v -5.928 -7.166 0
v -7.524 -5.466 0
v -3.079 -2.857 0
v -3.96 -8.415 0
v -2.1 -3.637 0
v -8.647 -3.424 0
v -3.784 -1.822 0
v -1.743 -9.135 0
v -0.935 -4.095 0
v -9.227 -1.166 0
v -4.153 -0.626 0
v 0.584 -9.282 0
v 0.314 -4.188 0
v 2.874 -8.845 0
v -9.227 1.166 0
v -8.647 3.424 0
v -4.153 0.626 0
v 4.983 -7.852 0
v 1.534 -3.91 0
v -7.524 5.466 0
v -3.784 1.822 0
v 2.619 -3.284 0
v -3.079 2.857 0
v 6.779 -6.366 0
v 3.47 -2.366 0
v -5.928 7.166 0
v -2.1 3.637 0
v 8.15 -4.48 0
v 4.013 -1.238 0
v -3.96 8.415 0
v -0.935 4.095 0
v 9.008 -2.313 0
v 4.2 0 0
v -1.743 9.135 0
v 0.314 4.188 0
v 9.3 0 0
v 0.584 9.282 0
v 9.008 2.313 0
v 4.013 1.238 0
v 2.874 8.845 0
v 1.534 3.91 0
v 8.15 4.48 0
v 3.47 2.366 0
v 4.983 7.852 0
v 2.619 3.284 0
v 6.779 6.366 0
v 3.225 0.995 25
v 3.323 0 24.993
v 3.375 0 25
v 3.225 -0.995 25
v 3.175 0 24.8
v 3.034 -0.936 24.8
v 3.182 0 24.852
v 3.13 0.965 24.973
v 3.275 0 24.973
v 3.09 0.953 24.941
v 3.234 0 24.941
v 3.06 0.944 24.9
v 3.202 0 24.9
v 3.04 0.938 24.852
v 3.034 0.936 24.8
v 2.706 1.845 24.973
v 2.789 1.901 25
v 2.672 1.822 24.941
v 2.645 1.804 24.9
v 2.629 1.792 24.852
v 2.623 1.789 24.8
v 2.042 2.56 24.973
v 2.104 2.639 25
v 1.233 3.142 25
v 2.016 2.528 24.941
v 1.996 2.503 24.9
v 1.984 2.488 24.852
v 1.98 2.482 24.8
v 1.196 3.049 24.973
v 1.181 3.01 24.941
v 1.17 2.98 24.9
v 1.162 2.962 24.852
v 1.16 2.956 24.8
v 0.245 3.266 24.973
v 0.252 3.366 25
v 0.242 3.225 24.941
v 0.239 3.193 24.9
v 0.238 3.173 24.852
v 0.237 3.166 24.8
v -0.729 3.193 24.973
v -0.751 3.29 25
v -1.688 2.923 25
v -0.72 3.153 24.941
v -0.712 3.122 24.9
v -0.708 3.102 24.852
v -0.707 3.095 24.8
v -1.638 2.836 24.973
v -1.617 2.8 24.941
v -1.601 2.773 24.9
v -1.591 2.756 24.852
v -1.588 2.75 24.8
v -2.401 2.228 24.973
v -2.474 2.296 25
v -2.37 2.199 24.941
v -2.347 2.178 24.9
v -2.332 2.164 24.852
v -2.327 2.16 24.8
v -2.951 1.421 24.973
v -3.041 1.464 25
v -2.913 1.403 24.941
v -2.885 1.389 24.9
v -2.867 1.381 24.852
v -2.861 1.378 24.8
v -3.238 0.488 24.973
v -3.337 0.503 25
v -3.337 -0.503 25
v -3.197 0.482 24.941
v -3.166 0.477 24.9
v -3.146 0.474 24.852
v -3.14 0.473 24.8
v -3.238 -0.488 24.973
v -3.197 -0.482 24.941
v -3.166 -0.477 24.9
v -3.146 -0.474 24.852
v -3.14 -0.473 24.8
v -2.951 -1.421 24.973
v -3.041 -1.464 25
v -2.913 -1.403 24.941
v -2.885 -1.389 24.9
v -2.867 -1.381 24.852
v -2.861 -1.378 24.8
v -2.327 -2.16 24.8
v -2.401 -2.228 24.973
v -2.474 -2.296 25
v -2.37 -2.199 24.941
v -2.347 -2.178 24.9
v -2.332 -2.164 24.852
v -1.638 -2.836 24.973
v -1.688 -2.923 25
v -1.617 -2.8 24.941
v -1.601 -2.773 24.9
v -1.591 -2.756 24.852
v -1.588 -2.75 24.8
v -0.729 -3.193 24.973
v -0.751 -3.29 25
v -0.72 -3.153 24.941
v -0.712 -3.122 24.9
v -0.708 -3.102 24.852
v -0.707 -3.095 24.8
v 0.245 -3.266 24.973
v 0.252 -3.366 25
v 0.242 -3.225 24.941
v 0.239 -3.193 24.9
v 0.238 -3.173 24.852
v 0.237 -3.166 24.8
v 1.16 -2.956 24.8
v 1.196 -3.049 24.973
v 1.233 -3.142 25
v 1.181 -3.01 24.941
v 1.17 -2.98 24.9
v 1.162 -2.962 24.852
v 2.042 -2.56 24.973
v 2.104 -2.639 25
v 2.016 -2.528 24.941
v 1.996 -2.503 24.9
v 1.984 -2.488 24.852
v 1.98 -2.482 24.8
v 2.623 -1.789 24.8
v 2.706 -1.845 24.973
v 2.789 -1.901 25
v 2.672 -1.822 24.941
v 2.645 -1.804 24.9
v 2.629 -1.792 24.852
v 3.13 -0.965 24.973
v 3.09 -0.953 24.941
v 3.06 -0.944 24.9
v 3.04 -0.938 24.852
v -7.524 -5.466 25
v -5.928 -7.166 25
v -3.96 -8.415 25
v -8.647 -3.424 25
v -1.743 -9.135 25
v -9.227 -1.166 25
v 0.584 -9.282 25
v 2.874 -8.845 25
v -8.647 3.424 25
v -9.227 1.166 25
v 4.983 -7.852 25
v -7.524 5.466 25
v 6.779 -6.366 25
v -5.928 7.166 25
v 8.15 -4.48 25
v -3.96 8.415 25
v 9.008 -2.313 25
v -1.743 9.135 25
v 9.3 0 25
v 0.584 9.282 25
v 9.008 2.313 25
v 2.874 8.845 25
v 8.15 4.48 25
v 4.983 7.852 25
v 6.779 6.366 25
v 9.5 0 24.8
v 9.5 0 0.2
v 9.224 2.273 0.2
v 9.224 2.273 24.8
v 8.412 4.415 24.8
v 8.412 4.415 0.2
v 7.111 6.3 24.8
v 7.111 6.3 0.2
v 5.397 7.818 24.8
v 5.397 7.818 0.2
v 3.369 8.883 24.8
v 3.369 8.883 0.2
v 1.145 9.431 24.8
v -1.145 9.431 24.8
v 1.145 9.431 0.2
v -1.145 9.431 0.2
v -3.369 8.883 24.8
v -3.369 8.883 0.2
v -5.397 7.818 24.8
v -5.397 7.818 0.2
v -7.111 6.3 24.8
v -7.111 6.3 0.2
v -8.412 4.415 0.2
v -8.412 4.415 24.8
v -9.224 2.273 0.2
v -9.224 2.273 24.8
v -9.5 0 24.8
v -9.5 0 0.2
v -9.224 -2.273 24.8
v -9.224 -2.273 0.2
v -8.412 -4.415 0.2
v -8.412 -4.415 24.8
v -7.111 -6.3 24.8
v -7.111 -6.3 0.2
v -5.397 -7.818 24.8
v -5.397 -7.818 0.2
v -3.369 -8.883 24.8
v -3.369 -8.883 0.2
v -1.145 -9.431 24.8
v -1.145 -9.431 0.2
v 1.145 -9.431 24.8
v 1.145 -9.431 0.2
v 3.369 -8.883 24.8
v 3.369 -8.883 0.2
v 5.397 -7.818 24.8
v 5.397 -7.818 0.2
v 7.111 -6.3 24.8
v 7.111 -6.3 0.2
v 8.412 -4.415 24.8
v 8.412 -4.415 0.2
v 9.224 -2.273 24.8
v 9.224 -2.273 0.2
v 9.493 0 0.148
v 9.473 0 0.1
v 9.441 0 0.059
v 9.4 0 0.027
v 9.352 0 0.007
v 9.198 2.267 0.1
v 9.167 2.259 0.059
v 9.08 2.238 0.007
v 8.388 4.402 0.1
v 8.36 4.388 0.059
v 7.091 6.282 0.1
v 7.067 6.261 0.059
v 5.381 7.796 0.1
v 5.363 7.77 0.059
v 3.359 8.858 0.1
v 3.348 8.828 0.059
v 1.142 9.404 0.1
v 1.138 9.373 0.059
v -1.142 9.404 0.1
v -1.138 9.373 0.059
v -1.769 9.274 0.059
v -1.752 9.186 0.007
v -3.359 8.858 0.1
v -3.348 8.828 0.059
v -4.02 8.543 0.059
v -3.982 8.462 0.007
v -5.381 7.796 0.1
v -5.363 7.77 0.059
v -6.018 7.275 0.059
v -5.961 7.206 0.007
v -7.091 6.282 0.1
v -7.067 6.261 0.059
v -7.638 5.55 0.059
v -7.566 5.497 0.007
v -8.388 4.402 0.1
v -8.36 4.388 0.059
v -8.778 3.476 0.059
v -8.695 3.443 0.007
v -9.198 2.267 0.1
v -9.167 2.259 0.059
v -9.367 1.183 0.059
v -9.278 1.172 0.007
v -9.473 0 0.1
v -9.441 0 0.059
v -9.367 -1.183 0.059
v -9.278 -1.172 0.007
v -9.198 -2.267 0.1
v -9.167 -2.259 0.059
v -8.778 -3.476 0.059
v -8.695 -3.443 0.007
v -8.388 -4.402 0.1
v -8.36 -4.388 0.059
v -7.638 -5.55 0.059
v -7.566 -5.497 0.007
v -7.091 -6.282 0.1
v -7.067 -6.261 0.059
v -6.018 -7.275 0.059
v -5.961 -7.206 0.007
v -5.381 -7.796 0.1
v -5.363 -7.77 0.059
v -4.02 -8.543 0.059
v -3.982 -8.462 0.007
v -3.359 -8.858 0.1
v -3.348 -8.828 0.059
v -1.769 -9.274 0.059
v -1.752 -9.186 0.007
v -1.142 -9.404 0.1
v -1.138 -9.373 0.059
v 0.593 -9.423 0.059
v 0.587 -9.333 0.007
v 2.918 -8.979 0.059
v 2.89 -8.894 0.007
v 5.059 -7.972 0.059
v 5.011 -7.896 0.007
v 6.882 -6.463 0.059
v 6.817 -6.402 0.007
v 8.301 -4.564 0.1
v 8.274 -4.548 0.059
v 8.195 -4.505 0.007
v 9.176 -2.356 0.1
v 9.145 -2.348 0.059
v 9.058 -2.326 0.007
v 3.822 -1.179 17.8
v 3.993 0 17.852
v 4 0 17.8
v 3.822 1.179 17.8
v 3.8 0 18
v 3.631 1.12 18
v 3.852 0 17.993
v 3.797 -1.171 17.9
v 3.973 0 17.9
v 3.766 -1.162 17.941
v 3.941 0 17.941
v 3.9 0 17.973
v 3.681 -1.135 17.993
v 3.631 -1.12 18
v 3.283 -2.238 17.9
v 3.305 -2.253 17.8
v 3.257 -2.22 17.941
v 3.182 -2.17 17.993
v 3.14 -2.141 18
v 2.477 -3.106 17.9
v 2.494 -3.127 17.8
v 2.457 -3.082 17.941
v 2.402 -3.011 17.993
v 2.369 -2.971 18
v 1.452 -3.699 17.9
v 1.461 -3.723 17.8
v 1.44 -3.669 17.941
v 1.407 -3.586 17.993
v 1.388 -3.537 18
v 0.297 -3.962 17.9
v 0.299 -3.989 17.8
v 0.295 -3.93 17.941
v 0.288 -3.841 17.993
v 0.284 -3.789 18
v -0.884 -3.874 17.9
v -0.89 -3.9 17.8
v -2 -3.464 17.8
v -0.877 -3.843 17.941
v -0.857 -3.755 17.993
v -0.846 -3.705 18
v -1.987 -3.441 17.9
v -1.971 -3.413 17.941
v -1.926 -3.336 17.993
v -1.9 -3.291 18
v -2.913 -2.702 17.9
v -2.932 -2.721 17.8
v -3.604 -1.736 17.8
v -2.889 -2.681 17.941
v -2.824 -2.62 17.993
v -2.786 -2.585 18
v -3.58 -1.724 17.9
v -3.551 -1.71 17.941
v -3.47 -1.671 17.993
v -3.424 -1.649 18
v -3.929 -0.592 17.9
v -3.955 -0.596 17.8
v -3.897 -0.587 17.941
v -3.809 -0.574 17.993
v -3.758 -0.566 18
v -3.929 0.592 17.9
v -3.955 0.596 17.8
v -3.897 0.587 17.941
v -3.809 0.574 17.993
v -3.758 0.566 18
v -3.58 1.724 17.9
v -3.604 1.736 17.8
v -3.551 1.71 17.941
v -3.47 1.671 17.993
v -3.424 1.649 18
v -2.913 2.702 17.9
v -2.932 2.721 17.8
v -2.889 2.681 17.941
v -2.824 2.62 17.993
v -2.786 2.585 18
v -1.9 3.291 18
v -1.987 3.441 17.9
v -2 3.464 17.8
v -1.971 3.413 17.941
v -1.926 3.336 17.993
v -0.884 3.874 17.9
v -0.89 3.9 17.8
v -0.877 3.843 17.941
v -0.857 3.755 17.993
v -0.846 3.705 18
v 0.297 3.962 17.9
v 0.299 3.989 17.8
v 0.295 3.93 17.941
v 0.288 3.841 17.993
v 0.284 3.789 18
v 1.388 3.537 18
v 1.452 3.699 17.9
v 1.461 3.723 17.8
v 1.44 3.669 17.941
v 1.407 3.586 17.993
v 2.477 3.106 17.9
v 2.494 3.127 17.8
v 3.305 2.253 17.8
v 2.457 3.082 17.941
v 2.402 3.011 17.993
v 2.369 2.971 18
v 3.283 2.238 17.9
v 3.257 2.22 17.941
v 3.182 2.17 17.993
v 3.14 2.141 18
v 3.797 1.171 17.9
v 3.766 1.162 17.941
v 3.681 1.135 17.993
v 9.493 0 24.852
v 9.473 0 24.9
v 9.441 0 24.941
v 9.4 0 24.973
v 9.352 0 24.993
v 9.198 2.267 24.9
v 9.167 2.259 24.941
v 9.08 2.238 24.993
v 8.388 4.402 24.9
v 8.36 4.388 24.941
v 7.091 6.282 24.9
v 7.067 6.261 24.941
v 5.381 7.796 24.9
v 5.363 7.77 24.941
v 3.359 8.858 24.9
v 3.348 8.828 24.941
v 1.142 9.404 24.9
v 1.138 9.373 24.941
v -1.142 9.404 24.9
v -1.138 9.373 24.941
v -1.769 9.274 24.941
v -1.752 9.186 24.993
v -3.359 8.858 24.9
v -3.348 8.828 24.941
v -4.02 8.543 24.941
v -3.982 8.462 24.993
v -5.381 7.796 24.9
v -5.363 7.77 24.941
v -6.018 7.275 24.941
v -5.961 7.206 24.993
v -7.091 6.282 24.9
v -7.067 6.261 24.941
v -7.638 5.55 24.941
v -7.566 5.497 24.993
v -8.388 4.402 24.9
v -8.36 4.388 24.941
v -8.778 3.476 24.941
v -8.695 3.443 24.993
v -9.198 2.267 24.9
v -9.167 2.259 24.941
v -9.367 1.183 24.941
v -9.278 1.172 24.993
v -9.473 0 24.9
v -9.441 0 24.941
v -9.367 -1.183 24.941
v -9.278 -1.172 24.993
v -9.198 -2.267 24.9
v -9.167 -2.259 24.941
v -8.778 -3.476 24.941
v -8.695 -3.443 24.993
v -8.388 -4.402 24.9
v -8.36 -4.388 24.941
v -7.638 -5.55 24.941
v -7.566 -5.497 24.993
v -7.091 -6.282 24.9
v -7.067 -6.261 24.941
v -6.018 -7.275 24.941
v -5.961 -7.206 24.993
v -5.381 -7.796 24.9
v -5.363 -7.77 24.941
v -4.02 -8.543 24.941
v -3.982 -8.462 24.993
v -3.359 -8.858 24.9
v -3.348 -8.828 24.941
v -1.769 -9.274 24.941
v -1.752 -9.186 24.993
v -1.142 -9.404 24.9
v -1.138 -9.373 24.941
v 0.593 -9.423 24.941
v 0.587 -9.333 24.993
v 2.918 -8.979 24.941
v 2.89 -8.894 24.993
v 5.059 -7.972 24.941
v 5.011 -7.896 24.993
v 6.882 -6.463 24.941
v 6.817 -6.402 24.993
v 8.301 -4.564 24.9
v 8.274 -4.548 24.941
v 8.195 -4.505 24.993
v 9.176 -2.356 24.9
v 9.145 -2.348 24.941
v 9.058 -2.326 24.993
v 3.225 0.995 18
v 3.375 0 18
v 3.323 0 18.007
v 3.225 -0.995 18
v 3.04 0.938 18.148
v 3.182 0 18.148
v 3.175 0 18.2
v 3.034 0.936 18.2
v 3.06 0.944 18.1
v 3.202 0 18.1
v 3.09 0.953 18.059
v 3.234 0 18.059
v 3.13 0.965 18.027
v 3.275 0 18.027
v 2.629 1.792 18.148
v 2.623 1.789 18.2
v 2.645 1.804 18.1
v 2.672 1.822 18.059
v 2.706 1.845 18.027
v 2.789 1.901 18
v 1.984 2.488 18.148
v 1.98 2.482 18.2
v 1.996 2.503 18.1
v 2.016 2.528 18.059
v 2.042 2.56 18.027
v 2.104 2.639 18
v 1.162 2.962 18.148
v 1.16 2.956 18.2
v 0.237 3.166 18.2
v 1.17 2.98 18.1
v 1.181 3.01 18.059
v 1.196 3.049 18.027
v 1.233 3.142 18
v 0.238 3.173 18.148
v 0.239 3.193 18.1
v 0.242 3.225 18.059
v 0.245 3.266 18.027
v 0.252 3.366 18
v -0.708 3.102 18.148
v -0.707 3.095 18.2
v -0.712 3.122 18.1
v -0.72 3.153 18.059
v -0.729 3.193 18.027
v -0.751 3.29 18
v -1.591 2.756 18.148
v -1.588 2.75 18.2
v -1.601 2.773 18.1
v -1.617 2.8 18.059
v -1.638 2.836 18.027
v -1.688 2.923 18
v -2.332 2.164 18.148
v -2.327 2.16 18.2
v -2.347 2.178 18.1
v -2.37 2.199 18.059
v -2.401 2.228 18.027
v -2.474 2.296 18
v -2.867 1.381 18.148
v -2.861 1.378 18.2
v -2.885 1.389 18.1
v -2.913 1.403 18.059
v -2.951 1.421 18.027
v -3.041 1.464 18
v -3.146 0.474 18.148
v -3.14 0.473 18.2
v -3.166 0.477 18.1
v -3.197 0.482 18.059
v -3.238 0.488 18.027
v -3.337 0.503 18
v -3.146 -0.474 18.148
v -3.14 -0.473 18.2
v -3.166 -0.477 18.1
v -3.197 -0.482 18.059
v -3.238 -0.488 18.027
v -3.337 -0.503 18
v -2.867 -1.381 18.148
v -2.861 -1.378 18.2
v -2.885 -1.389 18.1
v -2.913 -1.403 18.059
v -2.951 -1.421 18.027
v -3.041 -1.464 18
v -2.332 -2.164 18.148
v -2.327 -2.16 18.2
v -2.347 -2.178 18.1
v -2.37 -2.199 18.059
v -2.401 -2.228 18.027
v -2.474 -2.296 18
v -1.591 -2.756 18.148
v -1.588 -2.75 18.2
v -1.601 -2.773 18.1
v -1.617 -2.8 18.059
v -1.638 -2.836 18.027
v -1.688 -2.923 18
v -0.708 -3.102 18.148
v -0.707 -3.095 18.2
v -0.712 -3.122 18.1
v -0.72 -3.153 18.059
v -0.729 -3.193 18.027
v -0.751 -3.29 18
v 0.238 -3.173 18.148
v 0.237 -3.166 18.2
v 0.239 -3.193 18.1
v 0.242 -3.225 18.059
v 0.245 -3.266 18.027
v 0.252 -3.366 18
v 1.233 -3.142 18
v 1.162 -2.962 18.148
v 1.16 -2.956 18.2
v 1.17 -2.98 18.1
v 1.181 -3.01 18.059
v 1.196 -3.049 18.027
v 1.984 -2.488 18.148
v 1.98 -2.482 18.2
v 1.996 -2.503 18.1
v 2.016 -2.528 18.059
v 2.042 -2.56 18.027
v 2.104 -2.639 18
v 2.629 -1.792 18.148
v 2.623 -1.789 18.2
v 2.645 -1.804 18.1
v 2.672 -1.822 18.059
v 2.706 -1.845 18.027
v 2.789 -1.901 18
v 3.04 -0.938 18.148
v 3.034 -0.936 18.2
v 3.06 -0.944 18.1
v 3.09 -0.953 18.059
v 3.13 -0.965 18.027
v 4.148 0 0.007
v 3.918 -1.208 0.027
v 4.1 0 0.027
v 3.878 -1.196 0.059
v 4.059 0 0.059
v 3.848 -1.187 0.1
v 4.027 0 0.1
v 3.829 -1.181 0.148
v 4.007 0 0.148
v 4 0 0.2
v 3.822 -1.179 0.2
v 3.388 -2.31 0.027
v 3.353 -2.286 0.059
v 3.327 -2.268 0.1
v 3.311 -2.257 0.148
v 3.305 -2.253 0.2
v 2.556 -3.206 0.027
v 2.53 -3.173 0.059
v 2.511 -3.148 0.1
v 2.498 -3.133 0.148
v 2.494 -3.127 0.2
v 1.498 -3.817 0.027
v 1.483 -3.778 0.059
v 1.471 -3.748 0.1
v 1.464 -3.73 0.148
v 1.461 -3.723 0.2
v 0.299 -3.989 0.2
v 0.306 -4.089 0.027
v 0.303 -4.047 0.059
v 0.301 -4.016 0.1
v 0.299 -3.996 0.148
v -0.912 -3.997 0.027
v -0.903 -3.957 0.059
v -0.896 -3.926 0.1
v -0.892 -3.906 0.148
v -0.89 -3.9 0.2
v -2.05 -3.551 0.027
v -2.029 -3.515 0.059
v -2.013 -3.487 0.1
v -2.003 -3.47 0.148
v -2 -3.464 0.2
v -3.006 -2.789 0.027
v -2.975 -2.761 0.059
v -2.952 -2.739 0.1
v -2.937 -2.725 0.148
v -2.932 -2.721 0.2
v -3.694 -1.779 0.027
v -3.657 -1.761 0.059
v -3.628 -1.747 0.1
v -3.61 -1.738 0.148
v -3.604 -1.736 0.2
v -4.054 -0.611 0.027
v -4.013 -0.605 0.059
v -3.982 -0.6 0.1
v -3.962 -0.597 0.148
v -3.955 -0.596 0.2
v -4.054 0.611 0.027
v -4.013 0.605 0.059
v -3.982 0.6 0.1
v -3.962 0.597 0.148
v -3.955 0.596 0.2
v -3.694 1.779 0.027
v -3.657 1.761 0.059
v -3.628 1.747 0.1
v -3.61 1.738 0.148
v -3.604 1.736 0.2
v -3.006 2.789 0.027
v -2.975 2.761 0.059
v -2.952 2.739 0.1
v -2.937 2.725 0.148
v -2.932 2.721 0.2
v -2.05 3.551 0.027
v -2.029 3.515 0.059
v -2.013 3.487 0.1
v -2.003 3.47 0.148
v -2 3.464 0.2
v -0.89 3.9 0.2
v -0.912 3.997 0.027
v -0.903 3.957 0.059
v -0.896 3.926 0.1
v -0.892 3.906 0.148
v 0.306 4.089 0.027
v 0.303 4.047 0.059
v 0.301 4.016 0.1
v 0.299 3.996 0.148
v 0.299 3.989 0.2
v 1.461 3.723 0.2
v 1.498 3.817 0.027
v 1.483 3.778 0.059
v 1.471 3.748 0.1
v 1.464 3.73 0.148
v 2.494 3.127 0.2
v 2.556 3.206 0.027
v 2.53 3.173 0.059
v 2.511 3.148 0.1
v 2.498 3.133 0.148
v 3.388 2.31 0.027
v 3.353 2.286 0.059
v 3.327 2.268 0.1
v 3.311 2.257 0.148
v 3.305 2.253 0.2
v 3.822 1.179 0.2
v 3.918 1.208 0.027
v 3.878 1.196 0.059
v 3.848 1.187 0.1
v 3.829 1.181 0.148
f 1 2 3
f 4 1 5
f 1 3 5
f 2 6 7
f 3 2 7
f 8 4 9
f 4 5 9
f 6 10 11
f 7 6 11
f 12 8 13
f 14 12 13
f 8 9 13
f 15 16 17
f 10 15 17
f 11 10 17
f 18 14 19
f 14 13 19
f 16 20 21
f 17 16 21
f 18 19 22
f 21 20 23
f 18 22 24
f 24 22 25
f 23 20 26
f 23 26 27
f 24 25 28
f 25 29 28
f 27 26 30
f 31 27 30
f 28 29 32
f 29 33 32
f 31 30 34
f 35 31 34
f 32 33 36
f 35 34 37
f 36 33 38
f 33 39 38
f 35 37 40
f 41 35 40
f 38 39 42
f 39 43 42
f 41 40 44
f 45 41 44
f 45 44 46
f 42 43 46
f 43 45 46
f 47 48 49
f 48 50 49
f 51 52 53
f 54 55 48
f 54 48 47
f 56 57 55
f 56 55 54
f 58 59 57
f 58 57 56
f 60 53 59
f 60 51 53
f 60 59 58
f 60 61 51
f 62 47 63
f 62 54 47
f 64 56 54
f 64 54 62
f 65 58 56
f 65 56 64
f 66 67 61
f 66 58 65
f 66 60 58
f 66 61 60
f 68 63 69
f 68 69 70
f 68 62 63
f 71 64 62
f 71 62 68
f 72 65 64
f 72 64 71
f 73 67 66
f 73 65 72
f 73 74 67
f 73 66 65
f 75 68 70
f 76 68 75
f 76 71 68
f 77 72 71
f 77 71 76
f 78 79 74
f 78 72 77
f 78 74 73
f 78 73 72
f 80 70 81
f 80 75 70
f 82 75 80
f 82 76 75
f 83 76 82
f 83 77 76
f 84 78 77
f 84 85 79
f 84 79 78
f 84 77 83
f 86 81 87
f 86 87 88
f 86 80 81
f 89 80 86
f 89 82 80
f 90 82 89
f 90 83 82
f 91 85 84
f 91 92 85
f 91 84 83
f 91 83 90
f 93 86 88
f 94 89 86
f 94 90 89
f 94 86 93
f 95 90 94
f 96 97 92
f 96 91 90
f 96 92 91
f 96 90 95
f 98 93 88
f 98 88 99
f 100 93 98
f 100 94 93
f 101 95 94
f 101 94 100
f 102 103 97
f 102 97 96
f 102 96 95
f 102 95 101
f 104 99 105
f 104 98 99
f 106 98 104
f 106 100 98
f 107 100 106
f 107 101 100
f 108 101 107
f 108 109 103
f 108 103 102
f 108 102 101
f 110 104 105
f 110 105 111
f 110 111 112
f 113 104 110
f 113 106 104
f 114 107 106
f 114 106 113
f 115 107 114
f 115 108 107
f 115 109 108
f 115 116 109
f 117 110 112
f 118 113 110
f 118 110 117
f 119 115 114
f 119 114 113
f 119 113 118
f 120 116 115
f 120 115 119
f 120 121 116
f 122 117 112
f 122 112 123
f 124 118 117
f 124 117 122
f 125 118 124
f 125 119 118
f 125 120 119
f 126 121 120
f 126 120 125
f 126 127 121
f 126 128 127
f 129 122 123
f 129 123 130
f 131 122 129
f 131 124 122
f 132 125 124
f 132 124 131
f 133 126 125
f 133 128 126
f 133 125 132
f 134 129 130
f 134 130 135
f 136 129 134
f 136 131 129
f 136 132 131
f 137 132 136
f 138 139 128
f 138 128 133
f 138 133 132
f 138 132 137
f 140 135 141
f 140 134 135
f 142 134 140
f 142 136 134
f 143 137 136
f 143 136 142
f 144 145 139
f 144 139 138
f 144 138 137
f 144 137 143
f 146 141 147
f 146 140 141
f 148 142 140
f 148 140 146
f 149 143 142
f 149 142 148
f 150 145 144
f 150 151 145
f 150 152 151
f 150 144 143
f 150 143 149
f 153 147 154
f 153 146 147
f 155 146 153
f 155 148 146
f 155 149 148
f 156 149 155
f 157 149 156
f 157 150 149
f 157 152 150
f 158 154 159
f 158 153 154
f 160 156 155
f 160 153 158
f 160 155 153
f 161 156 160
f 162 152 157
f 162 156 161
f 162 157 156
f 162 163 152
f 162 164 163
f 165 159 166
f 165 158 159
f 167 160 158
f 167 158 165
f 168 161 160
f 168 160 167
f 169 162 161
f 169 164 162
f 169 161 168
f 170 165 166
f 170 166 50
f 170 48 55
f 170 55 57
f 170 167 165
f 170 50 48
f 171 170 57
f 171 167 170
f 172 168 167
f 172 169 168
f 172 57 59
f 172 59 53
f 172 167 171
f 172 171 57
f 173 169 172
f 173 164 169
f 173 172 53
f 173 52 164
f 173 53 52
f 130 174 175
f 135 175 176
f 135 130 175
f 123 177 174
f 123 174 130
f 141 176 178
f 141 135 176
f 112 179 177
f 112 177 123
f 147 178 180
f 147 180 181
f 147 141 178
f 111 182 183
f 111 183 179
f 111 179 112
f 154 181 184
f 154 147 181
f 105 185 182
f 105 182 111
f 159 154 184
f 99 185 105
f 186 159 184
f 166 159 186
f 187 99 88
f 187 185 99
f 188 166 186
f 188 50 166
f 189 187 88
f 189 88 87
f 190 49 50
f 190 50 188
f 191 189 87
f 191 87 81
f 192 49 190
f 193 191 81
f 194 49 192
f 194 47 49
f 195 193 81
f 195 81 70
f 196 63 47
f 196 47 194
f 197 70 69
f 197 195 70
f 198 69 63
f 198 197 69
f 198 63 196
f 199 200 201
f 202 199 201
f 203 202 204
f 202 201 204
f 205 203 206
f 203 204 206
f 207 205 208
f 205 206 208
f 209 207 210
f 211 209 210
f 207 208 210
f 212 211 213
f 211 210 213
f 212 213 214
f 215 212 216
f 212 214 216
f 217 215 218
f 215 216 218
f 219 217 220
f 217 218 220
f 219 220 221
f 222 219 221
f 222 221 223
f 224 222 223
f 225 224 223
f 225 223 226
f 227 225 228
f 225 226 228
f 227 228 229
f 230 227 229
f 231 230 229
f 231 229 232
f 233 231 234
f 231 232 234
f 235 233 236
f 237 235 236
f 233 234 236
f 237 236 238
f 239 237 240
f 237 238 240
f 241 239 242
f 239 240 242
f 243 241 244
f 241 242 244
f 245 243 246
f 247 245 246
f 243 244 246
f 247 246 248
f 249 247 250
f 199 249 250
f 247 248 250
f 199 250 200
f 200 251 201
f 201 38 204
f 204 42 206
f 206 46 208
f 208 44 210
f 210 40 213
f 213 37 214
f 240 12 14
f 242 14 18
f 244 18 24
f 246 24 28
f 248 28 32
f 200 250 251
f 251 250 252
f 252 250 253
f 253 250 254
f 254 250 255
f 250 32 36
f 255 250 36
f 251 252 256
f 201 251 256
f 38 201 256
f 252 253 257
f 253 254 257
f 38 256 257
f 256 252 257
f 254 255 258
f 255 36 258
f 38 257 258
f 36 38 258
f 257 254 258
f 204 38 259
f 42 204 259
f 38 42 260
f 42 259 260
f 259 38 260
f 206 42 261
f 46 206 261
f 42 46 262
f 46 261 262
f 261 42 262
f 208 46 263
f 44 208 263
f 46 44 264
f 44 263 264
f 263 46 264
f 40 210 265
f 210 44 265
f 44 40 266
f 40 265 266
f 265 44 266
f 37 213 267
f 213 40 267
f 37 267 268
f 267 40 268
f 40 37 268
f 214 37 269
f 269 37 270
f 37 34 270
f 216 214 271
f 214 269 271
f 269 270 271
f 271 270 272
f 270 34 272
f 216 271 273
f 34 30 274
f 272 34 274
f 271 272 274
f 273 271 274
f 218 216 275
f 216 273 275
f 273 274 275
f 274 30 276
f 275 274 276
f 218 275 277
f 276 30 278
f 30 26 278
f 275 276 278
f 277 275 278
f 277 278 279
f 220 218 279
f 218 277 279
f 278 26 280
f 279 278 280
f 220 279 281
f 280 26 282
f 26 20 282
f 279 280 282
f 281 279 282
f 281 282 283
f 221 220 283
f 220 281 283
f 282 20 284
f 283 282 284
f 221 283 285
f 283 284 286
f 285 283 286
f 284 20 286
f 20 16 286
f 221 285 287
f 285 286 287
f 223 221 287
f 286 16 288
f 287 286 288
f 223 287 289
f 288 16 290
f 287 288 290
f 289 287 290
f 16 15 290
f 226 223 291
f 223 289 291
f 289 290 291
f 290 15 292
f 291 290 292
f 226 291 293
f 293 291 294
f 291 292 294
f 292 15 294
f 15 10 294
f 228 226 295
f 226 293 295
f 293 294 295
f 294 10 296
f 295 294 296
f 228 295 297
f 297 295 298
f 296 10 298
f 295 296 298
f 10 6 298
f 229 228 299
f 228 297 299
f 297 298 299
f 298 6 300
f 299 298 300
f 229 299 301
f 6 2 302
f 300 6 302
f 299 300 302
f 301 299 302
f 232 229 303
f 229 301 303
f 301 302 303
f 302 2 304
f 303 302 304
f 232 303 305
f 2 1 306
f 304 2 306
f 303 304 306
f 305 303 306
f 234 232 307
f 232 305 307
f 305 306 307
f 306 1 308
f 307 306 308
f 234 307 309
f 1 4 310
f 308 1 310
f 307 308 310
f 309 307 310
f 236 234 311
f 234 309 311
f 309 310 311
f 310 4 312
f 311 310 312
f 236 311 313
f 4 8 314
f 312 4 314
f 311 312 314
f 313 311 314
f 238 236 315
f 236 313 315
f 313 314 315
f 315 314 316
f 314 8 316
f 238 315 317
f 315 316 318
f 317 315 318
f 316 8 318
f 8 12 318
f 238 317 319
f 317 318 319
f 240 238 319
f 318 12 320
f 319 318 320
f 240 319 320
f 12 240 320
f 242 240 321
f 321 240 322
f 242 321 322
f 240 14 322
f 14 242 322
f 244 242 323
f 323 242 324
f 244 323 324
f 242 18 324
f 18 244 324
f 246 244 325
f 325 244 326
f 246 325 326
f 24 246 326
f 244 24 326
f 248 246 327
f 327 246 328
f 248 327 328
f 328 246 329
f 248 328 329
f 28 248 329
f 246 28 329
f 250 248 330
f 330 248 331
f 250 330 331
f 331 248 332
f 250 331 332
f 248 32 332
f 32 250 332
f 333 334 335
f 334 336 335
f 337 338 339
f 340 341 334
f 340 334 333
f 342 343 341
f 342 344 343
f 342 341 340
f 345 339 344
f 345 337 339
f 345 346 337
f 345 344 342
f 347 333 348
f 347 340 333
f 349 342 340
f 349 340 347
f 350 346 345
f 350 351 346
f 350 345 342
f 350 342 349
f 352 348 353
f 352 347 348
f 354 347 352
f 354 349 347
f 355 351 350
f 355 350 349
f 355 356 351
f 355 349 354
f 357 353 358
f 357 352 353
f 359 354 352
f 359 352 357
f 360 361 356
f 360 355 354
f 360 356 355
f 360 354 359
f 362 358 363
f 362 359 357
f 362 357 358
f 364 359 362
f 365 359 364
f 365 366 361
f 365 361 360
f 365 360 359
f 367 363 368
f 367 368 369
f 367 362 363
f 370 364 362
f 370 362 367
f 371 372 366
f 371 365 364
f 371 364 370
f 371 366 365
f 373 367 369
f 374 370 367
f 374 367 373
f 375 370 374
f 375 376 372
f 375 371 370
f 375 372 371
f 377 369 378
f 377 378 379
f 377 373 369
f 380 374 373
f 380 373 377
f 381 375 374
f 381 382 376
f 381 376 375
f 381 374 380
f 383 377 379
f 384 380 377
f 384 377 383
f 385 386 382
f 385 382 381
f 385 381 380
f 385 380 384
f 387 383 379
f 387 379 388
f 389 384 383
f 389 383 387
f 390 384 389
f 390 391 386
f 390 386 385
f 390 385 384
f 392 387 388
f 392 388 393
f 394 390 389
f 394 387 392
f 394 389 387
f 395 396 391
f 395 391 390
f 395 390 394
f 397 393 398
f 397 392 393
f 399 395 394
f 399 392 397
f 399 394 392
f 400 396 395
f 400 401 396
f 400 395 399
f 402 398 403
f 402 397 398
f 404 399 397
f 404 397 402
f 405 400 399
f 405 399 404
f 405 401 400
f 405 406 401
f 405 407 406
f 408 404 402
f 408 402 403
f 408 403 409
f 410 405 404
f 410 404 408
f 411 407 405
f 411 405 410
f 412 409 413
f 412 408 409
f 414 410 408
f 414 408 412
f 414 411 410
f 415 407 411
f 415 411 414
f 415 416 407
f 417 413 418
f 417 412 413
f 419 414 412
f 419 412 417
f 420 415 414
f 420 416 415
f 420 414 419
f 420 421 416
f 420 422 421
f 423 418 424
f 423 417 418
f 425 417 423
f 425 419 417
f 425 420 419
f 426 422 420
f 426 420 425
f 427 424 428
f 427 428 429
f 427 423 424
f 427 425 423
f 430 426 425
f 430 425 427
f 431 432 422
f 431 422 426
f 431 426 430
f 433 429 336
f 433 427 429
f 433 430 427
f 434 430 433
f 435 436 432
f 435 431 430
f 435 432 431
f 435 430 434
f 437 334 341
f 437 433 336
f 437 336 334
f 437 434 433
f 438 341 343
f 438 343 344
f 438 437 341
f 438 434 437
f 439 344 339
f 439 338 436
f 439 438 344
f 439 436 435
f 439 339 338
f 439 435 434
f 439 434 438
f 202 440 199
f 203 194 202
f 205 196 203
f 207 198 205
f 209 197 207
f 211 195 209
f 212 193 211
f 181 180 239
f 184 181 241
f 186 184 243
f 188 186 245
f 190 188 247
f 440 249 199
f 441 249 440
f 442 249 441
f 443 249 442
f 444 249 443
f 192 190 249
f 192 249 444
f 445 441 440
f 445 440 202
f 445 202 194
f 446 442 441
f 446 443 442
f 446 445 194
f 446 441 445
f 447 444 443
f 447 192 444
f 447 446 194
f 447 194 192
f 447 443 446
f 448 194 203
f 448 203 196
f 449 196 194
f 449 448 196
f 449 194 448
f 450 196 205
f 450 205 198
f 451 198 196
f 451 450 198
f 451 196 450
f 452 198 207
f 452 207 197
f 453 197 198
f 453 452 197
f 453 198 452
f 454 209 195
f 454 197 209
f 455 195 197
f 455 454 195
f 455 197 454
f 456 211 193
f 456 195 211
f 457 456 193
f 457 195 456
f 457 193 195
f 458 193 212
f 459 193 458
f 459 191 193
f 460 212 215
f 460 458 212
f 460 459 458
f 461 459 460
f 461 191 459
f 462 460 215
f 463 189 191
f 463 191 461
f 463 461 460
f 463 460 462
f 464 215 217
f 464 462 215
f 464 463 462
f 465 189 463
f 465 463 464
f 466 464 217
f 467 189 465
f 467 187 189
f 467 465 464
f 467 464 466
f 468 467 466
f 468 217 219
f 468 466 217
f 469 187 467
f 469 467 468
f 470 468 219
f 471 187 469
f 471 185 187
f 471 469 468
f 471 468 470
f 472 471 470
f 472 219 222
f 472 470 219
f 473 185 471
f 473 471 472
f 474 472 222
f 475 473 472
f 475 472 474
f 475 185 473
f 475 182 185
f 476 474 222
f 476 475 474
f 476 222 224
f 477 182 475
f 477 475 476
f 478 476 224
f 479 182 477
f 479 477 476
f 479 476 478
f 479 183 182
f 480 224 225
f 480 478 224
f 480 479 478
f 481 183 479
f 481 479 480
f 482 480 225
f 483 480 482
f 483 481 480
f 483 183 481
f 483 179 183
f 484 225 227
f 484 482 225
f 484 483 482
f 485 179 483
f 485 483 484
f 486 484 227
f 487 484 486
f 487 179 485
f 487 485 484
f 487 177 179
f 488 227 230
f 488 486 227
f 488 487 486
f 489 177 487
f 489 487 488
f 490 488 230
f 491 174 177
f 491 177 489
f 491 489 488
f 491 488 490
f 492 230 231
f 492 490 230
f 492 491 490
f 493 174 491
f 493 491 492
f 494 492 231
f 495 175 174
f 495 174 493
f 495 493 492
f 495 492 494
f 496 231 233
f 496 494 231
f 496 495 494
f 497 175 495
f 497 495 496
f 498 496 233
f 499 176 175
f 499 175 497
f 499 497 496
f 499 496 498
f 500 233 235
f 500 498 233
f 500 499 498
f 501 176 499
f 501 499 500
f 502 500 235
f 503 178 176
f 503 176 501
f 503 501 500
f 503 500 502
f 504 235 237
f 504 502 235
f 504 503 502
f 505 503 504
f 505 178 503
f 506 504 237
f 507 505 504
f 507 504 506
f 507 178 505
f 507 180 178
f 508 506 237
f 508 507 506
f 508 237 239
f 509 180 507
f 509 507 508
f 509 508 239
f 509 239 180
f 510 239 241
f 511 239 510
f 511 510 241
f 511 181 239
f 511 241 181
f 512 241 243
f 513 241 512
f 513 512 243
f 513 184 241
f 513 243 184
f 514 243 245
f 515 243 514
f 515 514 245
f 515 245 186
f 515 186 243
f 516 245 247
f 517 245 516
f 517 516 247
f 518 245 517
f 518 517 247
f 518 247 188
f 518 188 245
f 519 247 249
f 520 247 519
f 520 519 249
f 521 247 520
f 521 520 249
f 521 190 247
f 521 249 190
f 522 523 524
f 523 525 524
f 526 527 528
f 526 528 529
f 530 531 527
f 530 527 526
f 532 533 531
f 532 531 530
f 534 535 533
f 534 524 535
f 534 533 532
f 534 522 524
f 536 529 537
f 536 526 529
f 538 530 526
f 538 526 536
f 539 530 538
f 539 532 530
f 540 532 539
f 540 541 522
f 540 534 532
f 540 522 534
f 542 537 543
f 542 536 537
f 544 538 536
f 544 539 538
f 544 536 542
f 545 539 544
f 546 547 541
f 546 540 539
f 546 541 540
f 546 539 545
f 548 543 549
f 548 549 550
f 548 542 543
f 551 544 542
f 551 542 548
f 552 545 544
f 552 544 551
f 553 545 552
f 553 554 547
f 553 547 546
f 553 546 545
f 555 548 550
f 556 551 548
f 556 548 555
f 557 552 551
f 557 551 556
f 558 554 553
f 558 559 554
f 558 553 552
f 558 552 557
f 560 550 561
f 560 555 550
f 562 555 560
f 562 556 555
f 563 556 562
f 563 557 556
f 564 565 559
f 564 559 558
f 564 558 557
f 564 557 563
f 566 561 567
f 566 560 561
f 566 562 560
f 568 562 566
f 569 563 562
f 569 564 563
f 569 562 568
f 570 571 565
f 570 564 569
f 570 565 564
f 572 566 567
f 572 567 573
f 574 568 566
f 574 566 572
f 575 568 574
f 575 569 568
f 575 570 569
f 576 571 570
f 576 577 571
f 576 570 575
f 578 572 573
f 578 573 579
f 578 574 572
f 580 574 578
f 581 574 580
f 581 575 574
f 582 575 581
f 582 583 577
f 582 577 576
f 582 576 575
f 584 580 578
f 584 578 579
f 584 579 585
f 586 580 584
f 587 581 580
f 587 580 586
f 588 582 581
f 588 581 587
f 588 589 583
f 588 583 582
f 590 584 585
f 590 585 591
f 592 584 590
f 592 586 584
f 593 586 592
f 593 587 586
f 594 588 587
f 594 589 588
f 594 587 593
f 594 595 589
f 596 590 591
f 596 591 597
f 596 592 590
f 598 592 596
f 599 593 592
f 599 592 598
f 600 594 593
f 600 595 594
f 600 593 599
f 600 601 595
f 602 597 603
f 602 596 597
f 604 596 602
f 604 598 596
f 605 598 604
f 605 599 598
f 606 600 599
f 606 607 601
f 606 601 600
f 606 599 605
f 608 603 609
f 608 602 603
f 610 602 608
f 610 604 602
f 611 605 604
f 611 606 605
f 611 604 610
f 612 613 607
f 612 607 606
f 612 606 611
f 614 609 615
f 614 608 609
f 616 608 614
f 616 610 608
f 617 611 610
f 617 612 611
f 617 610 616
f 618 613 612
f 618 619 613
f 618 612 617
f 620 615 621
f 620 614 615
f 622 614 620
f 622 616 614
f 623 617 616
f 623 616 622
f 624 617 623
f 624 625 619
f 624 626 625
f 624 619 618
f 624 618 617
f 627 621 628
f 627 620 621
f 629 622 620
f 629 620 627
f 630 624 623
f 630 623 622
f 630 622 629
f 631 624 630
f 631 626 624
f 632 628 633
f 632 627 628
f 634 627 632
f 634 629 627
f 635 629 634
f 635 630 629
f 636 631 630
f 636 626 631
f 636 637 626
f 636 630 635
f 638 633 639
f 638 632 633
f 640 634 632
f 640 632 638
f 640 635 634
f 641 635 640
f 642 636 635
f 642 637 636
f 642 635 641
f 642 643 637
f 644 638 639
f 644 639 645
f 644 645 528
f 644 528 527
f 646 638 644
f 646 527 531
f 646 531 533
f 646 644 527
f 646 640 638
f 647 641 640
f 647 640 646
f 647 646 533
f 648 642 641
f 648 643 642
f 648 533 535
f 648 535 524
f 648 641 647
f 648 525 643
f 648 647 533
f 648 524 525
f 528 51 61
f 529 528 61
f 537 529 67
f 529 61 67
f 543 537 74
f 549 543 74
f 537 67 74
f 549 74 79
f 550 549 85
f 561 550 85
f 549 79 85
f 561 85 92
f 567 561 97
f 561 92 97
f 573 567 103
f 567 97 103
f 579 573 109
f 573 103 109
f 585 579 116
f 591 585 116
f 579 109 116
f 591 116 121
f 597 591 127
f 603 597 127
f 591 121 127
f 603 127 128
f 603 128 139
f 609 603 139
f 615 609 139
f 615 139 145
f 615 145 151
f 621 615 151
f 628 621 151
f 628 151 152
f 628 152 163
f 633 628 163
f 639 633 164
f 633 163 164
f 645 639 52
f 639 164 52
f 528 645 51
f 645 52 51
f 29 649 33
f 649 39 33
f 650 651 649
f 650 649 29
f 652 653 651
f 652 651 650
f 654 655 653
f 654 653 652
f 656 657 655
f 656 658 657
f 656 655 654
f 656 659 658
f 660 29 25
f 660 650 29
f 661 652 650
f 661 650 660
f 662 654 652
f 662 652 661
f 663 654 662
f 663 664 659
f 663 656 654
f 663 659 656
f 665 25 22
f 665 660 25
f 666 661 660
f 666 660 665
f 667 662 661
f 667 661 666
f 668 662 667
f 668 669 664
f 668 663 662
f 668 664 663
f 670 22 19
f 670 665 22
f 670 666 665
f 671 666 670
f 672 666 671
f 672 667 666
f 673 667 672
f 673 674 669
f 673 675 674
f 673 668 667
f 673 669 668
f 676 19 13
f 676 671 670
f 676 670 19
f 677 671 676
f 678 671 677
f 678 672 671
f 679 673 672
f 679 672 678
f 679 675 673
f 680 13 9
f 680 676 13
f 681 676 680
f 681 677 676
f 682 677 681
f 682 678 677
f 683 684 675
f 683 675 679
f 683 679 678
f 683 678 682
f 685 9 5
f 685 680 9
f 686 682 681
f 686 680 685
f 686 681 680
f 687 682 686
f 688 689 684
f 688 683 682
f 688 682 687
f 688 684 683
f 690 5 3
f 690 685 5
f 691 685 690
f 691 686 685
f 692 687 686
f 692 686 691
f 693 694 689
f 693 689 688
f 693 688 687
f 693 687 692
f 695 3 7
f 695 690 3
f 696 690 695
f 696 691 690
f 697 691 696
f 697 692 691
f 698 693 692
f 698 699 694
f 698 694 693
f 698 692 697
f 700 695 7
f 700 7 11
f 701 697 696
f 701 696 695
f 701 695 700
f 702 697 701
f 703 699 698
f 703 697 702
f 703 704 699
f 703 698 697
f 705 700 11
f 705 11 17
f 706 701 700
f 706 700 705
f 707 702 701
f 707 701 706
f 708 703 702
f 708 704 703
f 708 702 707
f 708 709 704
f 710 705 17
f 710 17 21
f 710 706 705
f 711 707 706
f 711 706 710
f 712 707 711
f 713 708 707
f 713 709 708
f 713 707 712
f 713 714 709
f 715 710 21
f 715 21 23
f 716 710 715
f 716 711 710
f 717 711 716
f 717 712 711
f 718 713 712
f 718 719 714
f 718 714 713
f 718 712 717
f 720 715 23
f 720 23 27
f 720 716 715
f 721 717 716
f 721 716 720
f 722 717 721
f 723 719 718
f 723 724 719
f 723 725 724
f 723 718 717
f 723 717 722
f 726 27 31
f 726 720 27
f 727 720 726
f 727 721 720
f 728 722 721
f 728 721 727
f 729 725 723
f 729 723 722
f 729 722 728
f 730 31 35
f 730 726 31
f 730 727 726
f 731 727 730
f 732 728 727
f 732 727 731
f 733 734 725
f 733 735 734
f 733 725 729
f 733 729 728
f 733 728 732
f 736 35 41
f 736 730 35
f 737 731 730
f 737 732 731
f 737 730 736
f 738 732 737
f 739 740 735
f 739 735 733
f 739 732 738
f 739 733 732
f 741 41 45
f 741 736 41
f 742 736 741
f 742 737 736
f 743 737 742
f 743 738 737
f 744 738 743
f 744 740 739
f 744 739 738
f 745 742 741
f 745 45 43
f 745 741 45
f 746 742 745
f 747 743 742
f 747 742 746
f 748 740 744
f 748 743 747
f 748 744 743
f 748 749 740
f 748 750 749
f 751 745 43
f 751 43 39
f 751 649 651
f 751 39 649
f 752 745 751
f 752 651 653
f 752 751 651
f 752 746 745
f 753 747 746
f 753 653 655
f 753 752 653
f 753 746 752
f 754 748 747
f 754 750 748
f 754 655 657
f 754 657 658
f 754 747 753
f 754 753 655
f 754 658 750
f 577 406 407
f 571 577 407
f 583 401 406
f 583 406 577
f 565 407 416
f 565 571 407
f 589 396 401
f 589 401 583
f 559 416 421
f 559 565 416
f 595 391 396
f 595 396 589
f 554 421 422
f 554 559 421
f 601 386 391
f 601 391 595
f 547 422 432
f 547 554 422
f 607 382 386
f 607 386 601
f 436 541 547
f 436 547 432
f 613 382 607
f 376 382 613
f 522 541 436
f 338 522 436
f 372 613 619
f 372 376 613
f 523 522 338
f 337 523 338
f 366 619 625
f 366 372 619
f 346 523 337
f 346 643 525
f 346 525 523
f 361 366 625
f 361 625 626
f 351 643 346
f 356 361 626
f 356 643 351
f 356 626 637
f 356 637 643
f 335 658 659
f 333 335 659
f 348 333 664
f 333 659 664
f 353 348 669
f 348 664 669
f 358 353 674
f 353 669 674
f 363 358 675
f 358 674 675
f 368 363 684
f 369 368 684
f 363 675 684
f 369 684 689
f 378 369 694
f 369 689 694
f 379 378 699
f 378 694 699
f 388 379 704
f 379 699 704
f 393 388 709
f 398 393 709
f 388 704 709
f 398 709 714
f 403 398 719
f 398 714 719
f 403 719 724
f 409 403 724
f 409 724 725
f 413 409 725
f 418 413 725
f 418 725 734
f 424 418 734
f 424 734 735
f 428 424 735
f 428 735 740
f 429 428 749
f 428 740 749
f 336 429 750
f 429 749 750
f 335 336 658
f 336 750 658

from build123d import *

# Parameters (mm, degrees)
F0_R     = 9.5
F1_DEPTH = 25
F2_R     = 3.175
F3_DEPTH = 7
F4_R     = 4
F5_DEPTH = 18
F6_R     = 0.2


with BuildPart() as f1:
    # F0 (on Top) → F1 (new body)
    with BuildSketch(Plane.XY):
        Circle(F0_R)
    extrude(amount=F1_DEPTH)

    # F2 (on face) → F3 (cut)
    with BuildSketch(Plane.XY.offset(25)):
        Circle(F2_R)
    extrude(amount=-F3_DEPTH, mode=Mode.SUBTRACT)

    # F4 (on face) → F5 (cut)
    with BuildSketch(Plane(origin=(0, 0, 0), x_dir=(1, 0, 0), z_dir=(0, 0, -1))):
        Circle(F4_R)
    extrude(amount=-F5_DEPTH, mode=Mode.SUBTRACT)

    # F6
    f6_edges = [f1.edges().sort_by_distance(p)[0] for p in [
        (-9.5, 0, 25),
        (-9.5, 0, 0),
        (-3.175, 0, 25),
        (-4, 0, 18),
        (-3.175, 0, 18),
        (-4, 0, 0),
    ]]
    fillet(f6_edges, radius=F6_R)


solid = f1.part
